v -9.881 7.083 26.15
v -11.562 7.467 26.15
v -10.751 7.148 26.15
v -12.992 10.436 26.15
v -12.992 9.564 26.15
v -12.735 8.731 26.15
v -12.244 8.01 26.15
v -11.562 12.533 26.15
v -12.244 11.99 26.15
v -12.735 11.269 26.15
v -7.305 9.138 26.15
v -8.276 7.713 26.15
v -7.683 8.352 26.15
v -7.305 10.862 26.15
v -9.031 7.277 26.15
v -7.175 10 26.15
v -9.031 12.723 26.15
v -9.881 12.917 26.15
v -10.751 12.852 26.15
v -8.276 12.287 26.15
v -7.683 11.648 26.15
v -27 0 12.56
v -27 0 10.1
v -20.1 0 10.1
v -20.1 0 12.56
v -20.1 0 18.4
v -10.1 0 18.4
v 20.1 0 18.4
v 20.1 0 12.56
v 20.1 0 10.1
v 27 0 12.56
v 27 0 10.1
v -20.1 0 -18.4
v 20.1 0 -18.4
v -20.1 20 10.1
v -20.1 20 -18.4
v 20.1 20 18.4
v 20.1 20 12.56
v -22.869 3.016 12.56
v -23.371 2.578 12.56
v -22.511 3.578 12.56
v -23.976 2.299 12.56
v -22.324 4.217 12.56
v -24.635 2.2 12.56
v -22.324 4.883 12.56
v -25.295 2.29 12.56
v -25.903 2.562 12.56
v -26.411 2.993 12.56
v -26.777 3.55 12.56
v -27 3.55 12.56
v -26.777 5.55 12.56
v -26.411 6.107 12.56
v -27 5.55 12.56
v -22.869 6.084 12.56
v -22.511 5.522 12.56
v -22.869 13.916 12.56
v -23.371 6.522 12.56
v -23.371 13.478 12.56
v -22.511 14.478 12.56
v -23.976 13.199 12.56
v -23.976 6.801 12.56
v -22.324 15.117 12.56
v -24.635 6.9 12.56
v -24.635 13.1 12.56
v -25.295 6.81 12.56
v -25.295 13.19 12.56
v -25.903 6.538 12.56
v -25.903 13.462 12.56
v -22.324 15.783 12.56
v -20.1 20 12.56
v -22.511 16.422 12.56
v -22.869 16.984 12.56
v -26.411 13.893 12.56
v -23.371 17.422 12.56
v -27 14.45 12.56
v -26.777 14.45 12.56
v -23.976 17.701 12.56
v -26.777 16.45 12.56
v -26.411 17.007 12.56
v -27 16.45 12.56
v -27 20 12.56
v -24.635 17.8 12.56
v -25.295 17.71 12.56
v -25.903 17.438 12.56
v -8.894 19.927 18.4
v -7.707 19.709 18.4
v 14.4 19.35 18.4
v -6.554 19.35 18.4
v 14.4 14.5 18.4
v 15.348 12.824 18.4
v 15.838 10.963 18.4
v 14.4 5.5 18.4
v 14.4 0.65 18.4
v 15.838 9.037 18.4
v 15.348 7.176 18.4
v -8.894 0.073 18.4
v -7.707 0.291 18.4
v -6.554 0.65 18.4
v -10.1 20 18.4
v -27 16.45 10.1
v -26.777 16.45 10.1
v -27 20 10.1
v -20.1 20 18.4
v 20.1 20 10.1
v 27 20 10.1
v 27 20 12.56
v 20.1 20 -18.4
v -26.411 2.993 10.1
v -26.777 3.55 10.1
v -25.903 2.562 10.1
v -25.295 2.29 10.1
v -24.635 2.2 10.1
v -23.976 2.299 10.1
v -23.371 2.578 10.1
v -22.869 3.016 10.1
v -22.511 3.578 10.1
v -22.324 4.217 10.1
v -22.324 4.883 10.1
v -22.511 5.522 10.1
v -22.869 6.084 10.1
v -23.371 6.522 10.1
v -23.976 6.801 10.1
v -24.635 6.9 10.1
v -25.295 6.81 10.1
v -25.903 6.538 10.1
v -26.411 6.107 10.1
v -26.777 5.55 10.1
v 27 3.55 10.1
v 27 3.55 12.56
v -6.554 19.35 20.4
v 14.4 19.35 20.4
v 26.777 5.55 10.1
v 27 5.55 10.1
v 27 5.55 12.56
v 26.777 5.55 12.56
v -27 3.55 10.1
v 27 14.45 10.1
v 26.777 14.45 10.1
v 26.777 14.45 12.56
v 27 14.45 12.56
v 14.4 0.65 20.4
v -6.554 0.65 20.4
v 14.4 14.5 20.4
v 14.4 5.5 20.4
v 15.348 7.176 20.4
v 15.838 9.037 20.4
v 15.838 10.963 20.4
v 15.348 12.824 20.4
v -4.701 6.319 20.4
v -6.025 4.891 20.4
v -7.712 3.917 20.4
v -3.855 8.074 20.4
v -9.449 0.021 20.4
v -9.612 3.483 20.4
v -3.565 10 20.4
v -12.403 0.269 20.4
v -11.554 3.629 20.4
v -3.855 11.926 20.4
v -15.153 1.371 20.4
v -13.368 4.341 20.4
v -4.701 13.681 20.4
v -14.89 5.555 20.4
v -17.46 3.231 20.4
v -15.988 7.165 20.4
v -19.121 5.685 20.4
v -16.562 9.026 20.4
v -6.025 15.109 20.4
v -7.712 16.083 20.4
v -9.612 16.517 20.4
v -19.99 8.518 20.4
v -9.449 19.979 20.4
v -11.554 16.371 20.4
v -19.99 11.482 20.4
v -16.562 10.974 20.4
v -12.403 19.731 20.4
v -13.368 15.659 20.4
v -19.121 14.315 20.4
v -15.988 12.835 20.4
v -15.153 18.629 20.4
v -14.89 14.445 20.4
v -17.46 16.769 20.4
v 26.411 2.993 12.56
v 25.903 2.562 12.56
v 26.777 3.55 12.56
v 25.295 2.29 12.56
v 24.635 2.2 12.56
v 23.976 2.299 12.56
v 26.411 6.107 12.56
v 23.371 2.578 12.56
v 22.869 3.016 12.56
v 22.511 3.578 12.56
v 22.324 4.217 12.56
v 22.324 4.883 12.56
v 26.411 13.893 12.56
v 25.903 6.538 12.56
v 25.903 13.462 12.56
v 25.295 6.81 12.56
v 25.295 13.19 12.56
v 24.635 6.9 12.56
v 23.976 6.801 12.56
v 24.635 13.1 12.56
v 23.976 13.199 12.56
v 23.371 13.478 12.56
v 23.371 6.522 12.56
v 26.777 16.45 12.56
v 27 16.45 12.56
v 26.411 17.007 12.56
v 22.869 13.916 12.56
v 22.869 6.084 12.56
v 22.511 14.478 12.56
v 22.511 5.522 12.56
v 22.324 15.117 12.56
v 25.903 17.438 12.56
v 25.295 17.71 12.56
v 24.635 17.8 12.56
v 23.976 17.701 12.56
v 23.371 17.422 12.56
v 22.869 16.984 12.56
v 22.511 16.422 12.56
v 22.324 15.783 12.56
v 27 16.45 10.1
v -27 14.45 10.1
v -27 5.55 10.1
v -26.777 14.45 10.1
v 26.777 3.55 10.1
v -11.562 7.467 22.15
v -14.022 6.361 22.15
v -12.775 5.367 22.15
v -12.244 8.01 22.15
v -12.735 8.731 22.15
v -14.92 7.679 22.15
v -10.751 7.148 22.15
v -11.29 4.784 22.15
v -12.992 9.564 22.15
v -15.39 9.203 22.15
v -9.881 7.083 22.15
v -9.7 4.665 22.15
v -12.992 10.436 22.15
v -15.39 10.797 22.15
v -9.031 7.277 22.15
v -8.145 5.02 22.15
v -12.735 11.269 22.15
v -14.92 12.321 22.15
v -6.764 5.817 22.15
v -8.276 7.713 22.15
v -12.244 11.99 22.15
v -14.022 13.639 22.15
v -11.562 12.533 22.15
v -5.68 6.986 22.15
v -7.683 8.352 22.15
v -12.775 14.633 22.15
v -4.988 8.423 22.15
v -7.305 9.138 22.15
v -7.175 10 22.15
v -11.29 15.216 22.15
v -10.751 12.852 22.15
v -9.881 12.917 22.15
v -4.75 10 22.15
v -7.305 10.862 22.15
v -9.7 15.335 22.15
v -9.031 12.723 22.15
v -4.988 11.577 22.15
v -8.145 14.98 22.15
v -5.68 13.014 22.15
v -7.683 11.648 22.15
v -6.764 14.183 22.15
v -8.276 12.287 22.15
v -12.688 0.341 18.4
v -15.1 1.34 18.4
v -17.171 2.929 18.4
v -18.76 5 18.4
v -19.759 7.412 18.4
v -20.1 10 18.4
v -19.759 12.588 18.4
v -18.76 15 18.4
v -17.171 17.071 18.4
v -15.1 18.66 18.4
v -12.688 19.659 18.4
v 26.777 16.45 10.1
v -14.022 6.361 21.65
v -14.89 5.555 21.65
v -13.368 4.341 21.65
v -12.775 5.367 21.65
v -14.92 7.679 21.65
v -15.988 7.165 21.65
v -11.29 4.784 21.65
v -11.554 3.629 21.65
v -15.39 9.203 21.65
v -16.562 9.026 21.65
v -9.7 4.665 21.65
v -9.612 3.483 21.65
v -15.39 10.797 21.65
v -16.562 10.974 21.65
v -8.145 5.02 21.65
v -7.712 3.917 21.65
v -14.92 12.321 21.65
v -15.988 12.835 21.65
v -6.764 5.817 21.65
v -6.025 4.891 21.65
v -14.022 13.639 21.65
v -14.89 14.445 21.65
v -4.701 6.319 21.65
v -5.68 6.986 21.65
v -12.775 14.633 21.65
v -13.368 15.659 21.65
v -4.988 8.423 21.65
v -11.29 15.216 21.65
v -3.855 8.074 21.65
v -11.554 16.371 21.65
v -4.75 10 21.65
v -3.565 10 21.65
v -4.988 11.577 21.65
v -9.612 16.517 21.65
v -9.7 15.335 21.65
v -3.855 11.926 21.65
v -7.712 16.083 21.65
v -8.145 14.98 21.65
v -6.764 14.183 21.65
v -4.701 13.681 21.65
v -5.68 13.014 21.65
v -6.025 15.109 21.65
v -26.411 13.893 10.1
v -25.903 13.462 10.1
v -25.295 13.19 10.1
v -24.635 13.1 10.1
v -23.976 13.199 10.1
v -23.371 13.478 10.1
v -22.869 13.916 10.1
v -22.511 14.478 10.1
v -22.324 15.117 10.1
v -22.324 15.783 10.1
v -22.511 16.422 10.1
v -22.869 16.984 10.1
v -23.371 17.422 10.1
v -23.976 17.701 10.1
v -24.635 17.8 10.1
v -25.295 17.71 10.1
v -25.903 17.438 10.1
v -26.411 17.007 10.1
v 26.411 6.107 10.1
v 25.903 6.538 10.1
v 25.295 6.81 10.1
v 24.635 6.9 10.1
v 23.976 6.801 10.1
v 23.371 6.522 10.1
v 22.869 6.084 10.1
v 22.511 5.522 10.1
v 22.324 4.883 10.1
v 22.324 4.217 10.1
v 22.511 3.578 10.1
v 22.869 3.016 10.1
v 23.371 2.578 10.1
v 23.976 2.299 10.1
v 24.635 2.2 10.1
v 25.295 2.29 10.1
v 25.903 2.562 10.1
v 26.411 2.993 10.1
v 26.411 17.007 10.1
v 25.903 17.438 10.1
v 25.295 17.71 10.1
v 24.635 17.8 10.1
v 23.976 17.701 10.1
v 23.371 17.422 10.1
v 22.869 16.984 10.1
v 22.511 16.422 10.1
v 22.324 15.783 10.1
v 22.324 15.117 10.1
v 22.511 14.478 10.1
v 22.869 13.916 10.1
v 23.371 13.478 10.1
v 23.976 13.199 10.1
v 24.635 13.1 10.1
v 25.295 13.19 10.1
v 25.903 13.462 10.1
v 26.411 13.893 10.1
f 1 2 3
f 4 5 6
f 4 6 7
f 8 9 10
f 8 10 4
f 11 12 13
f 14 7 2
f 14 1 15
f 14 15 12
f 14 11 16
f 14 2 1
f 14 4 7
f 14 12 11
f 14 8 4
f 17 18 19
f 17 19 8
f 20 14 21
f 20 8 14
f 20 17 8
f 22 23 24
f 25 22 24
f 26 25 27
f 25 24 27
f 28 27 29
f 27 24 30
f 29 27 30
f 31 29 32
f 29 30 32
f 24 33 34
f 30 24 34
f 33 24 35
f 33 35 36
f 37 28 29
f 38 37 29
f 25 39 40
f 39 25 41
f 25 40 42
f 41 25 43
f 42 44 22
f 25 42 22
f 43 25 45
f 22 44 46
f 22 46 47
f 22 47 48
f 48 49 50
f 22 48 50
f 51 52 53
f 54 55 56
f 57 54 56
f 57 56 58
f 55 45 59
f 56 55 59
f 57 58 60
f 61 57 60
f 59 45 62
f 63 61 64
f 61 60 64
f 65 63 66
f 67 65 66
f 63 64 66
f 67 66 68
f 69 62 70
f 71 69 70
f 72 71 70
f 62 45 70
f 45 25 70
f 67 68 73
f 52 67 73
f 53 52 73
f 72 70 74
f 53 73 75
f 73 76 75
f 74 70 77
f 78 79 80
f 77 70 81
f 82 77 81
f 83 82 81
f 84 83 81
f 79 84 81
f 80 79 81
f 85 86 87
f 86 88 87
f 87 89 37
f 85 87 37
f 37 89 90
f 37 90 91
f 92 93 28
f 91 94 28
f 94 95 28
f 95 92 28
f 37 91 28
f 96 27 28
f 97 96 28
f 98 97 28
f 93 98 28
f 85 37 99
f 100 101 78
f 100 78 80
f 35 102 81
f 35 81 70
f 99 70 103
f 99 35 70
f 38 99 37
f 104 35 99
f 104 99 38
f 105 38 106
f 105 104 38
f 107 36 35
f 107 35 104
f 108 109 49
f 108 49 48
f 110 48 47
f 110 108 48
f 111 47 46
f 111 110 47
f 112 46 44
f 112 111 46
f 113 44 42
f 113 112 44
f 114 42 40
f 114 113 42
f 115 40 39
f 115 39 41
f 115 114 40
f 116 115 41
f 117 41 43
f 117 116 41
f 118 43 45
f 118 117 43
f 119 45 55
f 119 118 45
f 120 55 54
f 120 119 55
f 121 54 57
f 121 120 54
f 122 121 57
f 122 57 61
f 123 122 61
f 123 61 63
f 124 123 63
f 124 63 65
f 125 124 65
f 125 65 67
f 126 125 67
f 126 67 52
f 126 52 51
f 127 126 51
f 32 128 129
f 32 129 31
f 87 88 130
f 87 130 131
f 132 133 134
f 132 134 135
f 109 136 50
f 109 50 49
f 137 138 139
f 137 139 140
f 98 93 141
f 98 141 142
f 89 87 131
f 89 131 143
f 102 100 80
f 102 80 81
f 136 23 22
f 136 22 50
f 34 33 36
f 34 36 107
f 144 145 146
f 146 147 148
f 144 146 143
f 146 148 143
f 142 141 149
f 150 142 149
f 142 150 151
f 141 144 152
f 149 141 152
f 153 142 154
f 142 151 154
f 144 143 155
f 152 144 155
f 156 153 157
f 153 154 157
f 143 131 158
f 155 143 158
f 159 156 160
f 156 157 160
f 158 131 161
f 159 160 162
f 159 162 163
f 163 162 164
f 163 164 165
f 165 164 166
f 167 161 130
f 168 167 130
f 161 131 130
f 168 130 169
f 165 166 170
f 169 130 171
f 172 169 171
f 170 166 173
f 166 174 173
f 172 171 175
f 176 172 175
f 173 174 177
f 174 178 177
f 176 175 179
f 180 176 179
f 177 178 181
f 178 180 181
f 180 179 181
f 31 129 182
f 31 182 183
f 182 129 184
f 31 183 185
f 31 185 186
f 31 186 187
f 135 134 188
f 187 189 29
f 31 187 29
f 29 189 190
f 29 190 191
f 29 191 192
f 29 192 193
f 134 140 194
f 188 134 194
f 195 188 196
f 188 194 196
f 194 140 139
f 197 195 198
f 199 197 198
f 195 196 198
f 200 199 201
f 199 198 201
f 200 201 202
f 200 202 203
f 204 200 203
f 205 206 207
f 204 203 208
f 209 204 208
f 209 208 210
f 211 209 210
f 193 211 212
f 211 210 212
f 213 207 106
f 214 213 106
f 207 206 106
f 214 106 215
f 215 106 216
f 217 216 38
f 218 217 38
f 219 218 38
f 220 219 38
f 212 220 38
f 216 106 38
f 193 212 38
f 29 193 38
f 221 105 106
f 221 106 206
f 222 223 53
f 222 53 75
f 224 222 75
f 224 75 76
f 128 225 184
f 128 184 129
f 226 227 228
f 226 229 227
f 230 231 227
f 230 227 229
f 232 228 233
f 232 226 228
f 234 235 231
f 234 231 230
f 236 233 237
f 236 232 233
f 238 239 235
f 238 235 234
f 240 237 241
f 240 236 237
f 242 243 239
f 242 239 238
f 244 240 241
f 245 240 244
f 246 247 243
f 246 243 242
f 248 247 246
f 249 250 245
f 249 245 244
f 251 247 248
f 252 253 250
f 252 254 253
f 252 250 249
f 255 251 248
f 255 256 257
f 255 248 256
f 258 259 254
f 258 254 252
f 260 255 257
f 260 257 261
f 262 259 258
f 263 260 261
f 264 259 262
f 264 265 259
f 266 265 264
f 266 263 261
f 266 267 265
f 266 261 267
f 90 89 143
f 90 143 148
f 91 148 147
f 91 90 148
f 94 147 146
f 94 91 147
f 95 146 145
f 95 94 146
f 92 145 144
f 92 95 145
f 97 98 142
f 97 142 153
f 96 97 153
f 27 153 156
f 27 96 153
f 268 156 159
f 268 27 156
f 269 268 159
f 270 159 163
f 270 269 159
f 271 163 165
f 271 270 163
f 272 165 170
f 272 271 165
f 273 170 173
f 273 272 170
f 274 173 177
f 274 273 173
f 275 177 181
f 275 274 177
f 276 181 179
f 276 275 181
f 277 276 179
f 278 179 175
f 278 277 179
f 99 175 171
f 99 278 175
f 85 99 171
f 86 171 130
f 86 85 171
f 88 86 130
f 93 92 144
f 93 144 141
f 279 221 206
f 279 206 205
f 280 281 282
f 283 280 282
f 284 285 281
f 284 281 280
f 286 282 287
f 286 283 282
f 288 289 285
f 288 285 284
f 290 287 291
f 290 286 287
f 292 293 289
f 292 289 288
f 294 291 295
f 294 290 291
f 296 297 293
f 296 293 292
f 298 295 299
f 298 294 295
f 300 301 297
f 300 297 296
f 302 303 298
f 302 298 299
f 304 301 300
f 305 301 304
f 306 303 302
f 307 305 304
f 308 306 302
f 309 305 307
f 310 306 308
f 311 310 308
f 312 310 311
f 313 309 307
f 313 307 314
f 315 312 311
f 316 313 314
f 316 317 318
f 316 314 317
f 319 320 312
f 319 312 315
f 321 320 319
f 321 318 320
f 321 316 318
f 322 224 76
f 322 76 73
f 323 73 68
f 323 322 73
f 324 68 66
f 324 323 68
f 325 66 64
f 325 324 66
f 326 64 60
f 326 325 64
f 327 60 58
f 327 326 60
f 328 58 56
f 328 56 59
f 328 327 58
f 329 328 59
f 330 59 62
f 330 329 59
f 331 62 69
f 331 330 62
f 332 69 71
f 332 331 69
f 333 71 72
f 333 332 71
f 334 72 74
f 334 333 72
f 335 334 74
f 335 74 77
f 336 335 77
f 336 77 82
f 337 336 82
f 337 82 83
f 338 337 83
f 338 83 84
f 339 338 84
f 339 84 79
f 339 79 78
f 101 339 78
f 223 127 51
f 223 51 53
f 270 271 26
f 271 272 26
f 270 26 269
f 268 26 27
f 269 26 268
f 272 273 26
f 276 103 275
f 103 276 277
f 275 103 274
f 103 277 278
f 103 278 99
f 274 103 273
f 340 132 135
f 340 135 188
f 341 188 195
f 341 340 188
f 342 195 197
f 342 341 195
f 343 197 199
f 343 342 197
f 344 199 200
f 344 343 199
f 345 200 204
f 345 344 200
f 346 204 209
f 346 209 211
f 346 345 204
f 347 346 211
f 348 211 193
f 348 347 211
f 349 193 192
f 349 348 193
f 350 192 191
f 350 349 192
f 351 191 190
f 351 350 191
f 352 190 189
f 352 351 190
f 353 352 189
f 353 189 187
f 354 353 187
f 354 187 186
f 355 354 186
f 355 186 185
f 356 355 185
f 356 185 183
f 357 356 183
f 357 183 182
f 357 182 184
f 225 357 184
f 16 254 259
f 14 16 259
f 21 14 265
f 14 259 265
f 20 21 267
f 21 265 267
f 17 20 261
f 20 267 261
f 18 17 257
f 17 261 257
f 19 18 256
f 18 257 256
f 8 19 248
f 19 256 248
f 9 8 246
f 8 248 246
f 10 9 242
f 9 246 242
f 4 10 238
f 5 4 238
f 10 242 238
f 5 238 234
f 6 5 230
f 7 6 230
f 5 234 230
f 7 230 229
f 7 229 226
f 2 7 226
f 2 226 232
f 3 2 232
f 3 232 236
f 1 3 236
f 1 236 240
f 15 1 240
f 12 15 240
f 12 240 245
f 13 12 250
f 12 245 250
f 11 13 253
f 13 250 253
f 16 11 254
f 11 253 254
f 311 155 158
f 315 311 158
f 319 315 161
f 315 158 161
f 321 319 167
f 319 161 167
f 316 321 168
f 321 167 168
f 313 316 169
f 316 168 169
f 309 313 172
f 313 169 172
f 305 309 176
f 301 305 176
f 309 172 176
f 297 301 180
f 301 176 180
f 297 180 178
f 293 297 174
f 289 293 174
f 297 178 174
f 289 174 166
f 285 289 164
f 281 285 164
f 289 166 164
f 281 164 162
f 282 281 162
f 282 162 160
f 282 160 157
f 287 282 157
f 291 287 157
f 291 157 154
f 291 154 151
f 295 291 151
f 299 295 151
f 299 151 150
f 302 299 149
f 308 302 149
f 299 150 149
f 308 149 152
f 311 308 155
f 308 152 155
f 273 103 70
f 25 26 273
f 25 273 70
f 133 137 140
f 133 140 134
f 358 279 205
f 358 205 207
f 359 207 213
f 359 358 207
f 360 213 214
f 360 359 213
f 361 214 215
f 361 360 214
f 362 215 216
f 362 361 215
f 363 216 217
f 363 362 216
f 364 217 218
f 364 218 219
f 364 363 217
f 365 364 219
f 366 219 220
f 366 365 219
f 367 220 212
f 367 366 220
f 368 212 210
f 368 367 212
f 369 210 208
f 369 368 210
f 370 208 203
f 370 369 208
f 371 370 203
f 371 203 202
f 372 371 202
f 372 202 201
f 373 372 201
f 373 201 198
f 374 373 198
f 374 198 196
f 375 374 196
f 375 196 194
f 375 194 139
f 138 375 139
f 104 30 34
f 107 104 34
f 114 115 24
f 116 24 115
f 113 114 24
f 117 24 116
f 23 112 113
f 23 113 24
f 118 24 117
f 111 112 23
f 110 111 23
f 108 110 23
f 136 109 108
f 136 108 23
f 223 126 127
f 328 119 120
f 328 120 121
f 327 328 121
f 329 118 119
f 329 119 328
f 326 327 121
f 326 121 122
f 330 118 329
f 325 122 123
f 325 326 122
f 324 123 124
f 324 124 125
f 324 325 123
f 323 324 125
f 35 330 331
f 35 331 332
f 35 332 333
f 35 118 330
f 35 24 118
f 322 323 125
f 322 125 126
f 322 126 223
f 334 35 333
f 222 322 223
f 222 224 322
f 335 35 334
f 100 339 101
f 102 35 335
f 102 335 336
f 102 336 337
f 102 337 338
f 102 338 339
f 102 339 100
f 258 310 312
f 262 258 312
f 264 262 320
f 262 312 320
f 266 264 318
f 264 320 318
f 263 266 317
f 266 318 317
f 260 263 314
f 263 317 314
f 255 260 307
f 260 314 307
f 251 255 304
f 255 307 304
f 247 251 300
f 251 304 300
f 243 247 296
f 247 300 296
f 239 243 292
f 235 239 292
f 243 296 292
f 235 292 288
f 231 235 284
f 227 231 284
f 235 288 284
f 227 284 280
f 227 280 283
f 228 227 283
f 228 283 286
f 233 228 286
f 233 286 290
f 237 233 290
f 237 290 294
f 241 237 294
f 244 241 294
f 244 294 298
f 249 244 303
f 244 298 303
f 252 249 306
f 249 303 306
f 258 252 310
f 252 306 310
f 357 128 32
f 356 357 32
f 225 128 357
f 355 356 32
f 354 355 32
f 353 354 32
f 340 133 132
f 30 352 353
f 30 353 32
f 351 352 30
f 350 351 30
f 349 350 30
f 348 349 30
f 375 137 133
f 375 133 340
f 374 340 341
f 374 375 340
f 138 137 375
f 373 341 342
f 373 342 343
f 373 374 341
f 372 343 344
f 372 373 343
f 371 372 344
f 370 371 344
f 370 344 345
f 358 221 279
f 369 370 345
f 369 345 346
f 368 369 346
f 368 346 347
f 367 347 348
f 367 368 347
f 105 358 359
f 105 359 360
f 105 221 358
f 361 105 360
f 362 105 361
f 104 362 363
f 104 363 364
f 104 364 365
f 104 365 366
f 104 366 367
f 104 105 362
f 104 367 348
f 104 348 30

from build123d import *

# Parameters (mm, degrees)
SKIZZE1_W                       = 40.2
SKIZZE1_H                       = 36.8
AUFSATZ_LINEAR_AUSTRAGEN1_DEPTH = 20
AUFSATZ_LINEAR_AUSTRAGEN2_DEPTH = 2
SKIZZE3_R                       = 6.535
AUFSATZ_LINEAR_AUSTRAGEN3_DEPTH = 1.25
SKIZZE4_R                       = 5.35
AUFSATZ_LINEAR_AUSTRAGEN4_DEPTH = 0.5
SKIZZE5_R                       = 2.925
AUFSATZ_LINEAR_AUSTRAGEN5_DEPTH = 4
AUFSATZ_LINEAR_AUSTRAGEN6_DEPTH = 2.46


with BuildPart() as part:
    # Skizze1 → Aufsatz-Linear austragen1 (new body)
    with BuildSketch(Plane(origin=(0, 0, 0), x_dir=(1, 0, 0), z_dir=(0, 1, 0))):
        Rectangle(SKIZZE1_W, SKIZZE1_H)
    extrude(amount=AUFSATZ_LINEAR_AUSTRAGEN1_DEPTH)

    # Skizze2 → Aufsatz-Linear austragen2 (add)
    with BuildSketch(Plane.XY.offset(18.4)):
        with BuildLine():
            Line((-6.553522875, 19.35), (14.4, 19.35))
            Line((14.4, 19.35), (14.4, 14.5))
            ThreePointArc((14.4, 14.5), (15.9, 10), (14.4, 5.5))
            Line((14.4, 5.5), (14.4, 0.65))
            Line((14.4, 0.65), (-6.553522875, 0.65))
            ThreePointArc((-6.553522875, 0.65), (-20.1, 10), (-6.553522875, 19.35))
        make_face()
    extrude(amount=AUFSATZ_LINEAR_AUSTRAGEN2_DEPTH)

    # Skizze3 → Aufsatz-Linear austragen3 (add)
    with BuildSketch(Plane.XY.offset(20.4)):
        with Locations((-10.1, 10)):
            Circle(SKIZZE3_R)
    extrude(amount=AUFSATZ_LINEAR_AUSTRAGEN3_DEPTH)

    # Skizze4 → Aufsatz-Linear austragen4 (add)
    with BuildSketch(Plane.XY.offset(21.65)):
        with Locations((-10.1, 10)):
            Circle(SKIZZE4_R)
    extrude(amount=AUFSATZ_LINEAR_AUSTRAGEN4_DEPTH)

    # Skizze5 → Aufsatz-Linear austragen5 (add)
    with BuildSketch(Plane.XY.offset(22.15)):
        with Locations((-10.1, 10)):
            Circle(SKIZZE5_R)
    extrude(amount=AUFSATZ_LINEAR_AUSTRAGEN5_DEPTH)

    # Skizze6 → Aufsatz-Linear austragen6 (add)
    with BuildSketch(Plane(origin=(0, 0, 10.1), x_dir=(-1, 0, 0), z_dir=(0, 0, -1))):
        with BuildLine():
            Line((20.1, 20), (20.1, 0))
            Line((20.1, 0), (27, 0))
            Line((27, 0), (27, 3.55))
            Line((27, 3.55), (26.776617032, 3.55))
            ThreePointArc((26.776617032, 3.55), (22.3, 4.55), (26.776617032, 5.55))
            Line((26.776617032, 5.55), (27, 5.55))
            Line((27, 5.55), (27, 14.45))
            Line((27, 14.45), (26.776617032, 14.45))
            ThreePointArc((26.776617032, 14.45), (22.3, 15.45), (26.776617032, 16.45))
            Line((26.776617032, 16.45), (27, 16.45))
            Line((27, 16.45), (27, 20))
            Line((27, 20), (20.1, 20))
        make_face()
        with BuildLine():
            Line((-27, 3.55), (-27, 0))
            Line((-27, 0), (-20.1, 0))
            Line((-20.1, 0), (-20.1, 20))
            Line((-20.1, 20), (-27, 20))
            Line((-27, 20), (-27, 16.45))
            Line((-27, 16.45), (-26.776617032, 16.45))
            ThreePointArc((-26.776617032, 16.45), (-22.3, 15.45), (-26.776617032, 14.45))
            Line((-26.776617032, 14.45), (-27, 14.45))
            Line((-27, 14.45), (-27, 5.55))
            Line((-27, 5.55), (-26.776617032, 5.55))
            ThreePointArc((-26.776617032, 5.55), (-22.3, 4.55), (-26.776617032, 3.55))
            Line((-26.776617032, 3.55), (-27, 3.55))
        make_face()
    extrude(amount=-AUFSATZ_LINEAR_AUSTRAGEN6_DEPTH)


solid = part.part
